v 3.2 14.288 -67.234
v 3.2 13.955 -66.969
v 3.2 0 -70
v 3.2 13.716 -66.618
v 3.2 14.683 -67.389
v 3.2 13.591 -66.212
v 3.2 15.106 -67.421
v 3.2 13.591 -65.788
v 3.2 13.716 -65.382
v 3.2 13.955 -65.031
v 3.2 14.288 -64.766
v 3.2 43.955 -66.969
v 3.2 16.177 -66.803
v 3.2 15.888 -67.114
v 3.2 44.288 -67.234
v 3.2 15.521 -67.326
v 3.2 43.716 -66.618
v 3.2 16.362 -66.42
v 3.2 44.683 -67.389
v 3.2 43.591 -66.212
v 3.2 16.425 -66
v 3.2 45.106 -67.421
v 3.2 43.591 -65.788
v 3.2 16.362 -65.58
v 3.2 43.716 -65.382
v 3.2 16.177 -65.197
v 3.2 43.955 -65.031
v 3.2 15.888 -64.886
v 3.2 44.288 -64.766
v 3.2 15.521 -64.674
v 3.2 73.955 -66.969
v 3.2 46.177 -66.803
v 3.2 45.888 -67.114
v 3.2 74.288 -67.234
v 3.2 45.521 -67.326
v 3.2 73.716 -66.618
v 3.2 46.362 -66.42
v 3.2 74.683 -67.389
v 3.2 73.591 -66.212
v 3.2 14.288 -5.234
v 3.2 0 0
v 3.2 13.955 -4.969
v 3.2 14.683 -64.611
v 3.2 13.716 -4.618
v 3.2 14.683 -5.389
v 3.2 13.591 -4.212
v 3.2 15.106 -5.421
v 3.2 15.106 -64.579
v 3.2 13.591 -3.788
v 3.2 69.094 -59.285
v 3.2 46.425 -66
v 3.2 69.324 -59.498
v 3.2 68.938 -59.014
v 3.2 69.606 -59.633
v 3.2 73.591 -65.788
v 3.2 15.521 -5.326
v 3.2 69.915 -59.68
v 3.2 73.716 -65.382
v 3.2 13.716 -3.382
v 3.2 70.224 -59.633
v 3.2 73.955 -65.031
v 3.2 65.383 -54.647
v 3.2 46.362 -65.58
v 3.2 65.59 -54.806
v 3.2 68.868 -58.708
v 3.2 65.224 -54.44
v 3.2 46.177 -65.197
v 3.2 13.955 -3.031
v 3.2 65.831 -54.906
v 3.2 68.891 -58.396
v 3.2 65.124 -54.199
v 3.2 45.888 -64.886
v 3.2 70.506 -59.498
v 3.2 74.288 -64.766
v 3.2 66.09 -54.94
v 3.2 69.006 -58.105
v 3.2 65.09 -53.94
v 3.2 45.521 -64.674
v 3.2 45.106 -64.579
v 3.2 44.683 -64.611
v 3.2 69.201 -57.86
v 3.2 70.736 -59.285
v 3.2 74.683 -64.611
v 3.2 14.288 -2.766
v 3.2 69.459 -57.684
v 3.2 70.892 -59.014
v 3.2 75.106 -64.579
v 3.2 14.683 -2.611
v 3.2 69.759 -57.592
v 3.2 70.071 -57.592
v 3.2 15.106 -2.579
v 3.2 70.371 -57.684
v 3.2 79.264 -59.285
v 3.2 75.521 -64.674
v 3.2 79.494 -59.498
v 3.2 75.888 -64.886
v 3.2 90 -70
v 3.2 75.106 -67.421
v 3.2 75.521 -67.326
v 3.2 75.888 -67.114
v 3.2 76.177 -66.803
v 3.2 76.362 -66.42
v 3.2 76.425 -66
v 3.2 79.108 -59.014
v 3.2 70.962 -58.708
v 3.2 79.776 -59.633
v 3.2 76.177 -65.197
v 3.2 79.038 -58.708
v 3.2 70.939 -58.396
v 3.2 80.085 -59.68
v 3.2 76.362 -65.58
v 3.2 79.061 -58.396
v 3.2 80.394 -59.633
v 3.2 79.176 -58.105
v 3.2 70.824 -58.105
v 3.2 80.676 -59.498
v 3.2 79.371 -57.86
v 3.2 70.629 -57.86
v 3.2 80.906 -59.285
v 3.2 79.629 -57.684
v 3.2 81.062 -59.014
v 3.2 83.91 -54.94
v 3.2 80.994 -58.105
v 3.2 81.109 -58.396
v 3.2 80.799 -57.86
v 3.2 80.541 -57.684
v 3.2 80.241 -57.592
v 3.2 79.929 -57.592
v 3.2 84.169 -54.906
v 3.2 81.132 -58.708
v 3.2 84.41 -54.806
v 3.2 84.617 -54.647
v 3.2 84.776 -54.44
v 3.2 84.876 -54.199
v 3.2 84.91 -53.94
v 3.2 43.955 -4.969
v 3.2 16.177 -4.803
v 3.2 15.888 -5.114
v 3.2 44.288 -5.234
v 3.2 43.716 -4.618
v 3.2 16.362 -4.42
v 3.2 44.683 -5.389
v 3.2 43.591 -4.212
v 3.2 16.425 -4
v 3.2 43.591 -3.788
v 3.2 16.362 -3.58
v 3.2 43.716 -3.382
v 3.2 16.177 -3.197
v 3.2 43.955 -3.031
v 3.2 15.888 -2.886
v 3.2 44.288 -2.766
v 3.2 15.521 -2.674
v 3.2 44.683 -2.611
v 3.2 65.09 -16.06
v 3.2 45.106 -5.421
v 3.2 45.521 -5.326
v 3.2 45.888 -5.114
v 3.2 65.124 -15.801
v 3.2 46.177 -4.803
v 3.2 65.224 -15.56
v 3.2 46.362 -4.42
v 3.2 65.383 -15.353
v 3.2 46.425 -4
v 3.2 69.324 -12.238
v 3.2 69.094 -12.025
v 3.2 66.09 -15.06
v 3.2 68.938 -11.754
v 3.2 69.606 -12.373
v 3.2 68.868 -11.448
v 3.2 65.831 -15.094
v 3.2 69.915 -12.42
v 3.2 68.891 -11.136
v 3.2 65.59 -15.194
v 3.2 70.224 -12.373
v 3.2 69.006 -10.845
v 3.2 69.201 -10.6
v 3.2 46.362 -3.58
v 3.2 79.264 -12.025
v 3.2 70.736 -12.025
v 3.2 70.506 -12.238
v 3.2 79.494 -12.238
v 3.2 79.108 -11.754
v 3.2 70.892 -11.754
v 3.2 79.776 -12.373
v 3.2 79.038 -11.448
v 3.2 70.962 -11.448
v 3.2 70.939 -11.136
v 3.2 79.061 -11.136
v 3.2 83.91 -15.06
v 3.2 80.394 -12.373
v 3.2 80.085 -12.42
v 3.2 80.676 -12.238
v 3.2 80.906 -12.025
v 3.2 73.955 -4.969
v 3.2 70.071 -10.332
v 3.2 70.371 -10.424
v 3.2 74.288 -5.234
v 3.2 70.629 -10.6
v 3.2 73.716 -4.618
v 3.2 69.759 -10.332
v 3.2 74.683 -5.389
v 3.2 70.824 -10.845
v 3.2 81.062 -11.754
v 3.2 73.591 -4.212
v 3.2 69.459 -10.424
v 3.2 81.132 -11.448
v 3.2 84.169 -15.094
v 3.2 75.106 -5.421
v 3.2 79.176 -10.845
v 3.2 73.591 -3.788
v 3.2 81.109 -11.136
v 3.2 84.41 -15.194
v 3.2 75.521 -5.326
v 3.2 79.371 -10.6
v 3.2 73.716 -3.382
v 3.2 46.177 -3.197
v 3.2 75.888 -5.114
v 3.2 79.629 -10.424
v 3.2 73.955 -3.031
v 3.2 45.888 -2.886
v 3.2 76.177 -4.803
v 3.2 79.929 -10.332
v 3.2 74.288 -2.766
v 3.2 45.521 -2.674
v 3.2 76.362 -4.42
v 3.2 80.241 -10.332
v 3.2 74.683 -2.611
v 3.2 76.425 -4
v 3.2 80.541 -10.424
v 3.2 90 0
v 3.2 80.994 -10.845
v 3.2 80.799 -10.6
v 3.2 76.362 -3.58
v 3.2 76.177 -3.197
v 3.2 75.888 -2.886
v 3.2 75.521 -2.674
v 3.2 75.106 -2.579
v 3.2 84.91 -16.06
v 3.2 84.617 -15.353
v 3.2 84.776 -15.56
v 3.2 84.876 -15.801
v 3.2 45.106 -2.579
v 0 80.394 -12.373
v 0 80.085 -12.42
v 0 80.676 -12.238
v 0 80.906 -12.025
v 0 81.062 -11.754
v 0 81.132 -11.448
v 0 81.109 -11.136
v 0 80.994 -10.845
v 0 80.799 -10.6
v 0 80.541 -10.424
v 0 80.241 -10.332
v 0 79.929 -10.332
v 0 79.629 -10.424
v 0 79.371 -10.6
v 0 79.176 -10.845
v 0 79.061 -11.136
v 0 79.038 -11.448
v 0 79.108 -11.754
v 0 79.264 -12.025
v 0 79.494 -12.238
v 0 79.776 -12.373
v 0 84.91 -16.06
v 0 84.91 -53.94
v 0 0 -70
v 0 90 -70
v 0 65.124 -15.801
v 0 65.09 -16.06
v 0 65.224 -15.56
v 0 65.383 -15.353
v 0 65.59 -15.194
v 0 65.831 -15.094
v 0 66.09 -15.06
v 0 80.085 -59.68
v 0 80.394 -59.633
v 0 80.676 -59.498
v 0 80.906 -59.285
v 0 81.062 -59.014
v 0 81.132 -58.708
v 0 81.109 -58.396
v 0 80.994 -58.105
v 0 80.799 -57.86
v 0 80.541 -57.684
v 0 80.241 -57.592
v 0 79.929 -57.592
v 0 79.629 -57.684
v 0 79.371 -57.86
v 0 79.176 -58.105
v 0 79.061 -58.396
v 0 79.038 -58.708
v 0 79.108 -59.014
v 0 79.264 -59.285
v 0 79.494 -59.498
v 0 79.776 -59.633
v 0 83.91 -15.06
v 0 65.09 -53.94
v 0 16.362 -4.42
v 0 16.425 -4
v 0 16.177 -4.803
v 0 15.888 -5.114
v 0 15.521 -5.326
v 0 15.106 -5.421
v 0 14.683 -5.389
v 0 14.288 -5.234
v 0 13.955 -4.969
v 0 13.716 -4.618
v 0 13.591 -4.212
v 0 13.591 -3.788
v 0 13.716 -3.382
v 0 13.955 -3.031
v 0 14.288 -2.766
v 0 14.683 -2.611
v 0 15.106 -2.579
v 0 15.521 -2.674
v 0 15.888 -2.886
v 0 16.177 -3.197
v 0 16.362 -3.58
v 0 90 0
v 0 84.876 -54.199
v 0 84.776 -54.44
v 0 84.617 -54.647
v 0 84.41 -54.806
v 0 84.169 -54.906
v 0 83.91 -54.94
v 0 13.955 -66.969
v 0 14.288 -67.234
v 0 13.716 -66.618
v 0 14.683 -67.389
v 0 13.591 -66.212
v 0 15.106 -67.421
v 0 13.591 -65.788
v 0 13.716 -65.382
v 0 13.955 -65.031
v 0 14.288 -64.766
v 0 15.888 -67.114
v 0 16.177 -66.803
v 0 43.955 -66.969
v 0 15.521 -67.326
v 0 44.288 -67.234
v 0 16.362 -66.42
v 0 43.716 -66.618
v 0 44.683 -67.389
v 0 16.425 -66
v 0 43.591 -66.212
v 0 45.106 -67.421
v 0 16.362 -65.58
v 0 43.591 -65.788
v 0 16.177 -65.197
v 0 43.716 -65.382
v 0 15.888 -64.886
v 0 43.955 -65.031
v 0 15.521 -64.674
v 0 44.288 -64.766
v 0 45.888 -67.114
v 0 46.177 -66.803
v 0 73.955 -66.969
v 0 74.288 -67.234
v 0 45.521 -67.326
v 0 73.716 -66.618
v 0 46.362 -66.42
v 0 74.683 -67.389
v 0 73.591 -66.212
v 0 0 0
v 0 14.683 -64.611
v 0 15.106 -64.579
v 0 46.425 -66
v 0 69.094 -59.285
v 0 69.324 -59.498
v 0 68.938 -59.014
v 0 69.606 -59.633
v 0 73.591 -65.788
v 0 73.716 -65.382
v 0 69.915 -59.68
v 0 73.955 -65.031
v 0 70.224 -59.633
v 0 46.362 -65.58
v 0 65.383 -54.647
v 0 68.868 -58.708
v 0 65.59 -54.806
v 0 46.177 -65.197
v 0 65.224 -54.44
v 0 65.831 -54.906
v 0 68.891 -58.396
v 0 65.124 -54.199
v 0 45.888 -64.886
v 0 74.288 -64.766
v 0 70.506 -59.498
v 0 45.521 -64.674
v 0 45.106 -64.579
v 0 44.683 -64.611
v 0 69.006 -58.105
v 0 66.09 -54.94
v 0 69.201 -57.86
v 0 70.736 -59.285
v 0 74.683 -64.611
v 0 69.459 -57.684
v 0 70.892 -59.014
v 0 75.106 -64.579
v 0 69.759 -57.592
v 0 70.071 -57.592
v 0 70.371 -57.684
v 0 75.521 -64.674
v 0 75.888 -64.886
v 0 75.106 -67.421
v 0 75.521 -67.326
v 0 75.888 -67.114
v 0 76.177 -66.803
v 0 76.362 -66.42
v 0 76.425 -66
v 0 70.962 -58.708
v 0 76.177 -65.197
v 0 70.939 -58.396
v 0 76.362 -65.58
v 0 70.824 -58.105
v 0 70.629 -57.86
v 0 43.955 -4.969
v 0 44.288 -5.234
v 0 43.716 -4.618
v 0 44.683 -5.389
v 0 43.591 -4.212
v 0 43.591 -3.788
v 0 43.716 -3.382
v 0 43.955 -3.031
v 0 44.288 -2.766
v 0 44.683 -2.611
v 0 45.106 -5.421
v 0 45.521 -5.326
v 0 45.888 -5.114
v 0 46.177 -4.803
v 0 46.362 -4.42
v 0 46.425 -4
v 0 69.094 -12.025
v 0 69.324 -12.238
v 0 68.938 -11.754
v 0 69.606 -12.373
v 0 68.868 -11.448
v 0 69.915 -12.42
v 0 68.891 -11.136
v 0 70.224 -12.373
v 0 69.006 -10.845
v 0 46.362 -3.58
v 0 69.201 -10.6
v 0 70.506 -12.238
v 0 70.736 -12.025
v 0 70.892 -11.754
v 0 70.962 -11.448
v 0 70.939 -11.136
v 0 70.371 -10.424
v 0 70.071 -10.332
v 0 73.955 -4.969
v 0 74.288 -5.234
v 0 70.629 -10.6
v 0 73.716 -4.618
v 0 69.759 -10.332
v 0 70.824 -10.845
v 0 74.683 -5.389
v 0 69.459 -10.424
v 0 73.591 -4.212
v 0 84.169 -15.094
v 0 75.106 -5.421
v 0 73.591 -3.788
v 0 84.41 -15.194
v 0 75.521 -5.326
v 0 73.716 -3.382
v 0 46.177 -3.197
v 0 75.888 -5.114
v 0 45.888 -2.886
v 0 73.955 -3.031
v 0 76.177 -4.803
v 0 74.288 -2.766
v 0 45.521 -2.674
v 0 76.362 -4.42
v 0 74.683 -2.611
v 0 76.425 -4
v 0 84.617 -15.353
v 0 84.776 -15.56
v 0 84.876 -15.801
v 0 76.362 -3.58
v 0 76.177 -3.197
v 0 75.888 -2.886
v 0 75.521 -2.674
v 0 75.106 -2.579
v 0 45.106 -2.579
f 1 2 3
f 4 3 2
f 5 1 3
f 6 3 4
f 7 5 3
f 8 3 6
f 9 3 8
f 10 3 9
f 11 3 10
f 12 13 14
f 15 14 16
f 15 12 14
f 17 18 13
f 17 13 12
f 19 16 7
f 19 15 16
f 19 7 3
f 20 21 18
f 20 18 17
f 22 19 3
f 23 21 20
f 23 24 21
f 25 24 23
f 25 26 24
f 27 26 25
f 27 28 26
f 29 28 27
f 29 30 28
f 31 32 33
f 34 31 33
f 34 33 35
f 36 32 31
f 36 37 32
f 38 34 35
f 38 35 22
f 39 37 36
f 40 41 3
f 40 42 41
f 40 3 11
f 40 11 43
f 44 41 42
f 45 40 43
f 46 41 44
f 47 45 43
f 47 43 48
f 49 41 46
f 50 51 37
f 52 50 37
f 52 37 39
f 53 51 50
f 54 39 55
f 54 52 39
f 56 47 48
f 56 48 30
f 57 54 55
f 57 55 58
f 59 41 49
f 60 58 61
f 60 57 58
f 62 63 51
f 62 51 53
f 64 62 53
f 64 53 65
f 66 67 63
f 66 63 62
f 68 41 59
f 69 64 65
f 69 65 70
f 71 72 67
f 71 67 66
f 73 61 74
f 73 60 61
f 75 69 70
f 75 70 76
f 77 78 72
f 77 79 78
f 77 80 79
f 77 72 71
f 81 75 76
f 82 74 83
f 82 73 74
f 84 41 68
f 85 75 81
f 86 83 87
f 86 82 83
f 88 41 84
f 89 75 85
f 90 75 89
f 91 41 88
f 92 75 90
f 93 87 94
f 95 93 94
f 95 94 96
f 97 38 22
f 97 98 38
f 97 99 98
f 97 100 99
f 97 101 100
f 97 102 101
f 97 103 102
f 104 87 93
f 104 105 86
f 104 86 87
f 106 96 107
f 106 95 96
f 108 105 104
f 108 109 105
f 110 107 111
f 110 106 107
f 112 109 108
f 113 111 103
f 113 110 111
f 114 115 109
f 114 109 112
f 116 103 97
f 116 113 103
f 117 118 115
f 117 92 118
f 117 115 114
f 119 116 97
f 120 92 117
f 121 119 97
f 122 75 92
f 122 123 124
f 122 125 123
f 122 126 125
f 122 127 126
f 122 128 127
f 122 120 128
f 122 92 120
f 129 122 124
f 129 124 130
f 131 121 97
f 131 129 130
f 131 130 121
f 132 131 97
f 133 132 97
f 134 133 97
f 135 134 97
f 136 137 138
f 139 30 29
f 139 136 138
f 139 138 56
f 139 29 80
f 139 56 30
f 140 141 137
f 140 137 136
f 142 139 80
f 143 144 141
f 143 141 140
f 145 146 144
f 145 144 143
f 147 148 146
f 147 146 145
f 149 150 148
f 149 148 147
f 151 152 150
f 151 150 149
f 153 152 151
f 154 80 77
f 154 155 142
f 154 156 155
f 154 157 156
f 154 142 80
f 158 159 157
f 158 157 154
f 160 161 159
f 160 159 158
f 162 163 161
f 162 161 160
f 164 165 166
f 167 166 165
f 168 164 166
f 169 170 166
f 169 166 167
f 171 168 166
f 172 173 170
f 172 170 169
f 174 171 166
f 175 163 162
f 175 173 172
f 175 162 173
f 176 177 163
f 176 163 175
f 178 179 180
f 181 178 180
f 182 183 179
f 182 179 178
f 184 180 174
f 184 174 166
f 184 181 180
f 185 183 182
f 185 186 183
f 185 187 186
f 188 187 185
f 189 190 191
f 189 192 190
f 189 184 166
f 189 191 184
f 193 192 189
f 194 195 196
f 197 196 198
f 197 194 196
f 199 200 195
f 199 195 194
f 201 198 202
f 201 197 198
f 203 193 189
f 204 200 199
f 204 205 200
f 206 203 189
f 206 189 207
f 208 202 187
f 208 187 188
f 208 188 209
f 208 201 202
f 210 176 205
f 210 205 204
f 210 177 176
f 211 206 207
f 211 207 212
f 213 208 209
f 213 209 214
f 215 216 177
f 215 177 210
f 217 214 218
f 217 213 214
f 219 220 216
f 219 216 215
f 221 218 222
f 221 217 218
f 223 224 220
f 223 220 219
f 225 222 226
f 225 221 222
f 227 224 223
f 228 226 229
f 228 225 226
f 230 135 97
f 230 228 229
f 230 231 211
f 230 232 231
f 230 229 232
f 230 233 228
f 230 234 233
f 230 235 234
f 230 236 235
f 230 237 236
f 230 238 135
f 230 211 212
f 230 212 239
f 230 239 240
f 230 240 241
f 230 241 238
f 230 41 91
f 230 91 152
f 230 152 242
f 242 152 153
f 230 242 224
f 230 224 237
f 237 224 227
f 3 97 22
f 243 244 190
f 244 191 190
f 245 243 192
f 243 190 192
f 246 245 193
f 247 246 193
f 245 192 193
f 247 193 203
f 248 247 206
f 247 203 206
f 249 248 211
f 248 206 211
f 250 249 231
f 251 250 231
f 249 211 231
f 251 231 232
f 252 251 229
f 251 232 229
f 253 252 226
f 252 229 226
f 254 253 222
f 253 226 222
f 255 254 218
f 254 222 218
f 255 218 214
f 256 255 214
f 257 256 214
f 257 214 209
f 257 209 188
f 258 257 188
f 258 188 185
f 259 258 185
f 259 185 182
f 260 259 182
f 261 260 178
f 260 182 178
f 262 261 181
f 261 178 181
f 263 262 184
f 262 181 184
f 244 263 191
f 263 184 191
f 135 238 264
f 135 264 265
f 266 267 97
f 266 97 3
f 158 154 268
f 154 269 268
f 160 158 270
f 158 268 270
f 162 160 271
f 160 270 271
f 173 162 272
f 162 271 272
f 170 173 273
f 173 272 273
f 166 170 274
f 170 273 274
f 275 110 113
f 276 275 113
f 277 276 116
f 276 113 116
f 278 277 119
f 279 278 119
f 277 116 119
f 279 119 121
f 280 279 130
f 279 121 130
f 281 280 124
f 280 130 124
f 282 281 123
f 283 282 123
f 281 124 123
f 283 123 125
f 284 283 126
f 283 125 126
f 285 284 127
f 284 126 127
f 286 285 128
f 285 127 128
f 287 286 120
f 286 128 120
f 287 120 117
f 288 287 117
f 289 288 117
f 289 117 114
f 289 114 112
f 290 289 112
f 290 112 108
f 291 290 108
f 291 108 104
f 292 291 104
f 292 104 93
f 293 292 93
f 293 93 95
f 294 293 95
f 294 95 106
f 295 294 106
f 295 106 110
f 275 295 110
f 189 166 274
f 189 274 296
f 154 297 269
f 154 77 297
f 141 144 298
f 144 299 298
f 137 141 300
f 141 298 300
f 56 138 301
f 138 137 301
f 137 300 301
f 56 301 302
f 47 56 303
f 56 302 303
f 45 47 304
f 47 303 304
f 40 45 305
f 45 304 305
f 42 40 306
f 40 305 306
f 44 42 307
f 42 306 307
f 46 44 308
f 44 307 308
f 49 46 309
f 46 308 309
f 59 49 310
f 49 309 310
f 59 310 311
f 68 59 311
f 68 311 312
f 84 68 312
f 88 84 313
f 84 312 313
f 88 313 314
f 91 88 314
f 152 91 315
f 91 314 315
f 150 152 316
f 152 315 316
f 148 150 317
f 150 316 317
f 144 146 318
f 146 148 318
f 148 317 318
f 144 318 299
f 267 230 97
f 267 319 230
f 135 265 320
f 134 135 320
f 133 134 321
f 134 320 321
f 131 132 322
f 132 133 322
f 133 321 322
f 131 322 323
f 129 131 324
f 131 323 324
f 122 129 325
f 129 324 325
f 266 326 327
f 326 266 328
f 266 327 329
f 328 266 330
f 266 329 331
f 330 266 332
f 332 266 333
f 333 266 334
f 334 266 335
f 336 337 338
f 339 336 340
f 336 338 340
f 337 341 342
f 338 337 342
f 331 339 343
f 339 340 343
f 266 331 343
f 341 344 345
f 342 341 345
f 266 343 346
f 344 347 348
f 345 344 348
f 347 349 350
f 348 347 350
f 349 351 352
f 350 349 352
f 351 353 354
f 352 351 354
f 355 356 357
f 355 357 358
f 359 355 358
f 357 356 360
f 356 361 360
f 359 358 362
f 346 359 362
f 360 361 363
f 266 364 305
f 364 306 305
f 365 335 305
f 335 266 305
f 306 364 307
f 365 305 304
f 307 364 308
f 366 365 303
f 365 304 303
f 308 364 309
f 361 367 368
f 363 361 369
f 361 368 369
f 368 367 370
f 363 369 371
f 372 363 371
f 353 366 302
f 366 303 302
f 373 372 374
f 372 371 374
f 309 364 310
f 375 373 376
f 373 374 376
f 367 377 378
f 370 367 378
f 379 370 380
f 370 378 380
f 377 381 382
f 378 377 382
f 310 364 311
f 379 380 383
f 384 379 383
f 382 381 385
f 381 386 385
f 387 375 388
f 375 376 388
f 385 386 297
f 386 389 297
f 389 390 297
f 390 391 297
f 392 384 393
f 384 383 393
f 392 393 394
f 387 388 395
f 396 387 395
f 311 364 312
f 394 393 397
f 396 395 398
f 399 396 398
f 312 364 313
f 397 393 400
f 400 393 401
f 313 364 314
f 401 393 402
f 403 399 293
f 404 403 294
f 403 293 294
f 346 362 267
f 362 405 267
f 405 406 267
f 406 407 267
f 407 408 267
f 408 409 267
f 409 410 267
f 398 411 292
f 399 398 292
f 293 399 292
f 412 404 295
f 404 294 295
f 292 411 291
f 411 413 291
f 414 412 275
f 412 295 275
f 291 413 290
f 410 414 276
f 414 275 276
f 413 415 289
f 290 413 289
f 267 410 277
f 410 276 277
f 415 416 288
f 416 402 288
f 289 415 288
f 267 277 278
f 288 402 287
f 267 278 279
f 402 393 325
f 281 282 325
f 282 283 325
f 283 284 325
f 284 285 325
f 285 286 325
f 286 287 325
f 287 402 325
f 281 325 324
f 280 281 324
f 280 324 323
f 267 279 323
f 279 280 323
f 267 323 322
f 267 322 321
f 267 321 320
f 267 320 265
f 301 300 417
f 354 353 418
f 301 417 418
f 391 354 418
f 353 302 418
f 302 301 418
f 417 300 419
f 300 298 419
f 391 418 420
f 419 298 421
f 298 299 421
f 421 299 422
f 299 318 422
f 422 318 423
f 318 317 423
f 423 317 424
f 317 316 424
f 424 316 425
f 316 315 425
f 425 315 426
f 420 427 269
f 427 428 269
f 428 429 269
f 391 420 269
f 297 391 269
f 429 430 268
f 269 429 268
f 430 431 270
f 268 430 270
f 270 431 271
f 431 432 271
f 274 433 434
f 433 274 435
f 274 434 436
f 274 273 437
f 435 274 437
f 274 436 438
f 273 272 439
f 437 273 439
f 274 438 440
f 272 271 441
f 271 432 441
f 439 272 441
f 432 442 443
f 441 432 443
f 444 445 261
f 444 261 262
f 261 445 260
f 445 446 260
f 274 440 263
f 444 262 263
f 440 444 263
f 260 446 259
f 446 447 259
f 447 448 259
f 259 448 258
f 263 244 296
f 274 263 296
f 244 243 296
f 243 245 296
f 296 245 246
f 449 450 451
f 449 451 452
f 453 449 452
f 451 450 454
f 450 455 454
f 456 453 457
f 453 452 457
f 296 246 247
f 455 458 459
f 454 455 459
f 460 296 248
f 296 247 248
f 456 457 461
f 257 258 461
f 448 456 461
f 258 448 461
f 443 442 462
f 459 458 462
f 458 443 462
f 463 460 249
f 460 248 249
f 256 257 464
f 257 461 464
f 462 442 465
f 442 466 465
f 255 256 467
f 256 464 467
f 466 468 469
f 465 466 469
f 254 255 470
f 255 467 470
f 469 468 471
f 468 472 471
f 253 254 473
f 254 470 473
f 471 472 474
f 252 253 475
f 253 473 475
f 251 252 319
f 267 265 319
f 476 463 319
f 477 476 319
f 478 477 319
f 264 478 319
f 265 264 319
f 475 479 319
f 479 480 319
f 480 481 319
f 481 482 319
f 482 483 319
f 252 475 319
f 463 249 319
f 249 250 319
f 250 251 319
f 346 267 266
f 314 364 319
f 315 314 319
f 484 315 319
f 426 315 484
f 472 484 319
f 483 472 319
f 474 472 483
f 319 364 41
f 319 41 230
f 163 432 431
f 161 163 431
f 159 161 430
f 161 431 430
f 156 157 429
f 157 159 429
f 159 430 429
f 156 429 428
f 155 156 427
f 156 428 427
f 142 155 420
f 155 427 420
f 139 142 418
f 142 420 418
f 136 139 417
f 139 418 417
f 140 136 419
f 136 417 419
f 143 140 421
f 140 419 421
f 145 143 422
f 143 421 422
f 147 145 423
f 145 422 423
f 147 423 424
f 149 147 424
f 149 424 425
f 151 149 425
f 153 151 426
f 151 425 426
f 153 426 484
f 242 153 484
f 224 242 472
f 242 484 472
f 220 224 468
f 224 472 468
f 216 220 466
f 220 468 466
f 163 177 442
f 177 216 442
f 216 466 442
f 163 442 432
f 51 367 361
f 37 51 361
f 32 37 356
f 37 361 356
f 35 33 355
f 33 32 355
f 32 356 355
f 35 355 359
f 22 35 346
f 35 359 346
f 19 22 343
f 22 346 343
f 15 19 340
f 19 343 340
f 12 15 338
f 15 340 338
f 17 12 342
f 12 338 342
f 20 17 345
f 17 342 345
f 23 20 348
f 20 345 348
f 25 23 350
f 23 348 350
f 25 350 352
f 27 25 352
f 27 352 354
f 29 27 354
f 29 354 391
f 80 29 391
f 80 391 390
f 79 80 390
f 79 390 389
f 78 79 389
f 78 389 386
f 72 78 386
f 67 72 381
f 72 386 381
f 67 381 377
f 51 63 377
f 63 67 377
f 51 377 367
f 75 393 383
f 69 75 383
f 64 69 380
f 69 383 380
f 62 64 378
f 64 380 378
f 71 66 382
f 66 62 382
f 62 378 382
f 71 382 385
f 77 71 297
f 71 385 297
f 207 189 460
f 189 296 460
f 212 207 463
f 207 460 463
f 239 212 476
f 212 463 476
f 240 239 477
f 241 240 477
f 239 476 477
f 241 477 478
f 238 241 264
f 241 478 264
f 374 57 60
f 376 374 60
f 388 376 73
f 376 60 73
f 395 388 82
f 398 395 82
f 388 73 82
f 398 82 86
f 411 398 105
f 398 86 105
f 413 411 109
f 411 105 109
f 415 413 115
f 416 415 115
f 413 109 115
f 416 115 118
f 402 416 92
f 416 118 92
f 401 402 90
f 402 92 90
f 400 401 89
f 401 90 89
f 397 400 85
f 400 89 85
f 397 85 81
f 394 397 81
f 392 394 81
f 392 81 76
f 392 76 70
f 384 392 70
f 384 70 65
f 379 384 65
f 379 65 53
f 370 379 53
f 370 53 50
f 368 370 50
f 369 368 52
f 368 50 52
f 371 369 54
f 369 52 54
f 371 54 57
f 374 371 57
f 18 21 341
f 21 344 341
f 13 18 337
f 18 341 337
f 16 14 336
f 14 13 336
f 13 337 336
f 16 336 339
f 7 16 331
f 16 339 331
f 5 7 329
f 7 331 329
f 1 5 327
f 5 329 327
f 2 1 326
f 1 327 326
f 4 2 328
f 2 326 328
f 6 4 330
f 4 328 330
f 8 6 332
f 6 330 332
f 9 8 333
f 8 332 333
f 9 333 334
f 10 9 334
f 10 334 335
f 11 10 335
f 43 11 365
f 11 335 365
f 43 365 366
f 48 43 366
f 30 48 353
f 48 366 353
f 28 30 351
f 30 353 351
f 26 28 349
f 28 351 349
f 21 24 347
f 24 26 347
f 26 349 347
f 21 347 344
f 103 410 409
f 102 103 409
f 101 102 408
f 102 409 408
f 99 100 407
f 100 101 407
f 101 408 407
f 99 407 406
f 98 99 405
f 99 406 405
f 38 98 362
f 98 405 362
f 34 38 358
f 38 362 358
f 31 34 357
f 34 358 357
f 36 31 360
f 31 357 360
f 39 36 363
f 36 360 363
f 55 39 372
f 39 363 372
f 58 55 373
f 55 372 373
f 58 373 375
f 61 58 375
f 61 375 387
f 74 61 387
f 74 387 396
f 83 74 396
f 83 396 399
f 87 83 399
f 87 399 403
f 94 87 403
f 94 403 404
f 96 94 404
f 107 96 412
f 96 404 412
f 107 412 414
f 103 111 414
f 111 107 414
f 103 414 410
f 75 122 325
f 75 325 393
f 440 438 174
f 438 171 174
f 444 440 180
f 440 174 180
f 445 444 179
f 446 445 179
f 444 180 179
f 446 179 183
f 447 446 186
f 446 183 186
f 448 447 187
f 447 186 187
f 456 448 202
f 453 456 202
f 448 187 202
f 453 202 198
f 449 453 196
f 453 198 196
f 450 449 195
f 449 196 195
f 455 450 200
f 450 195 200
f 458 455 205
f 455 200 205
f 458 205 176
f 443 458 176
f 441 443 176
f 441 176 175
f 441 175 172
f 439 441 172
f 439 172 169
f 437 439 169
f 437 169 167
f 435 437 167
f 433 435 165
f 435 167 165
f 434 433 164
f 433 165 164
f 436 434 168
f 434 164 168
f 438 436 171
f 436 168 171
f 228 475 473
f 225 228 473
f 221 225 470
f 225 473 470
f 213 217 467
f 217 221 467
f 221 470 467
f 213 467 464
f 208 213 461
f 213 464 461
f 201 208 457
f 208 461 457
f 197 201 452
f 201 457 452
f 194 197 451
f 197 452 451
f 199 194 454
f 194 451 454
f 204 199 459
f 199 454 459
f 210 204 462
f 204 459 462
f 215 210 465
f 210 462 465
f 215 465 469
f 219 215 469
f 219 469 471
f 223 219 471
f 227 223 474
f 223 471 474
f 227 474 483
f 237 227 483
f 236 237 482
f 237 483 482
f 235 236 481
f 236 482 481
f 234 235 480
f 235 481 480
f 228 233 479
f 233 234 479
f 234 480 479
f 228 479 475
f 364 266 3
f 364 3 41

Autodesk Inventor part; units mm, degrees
ref_plane "YZ Plane" through (0, 0, 0) normal (1, 0, 0) x (0, 1, 0)
ref_plane "XZ Plane" through (0, 0, 0) normal (0, 1, 0) x (-1, 0, 0)
ref_plane "XY Plane" through (0, 0, 0) normal (0, 0, 1) x (1, 0, 0)
sketch "Sketch1" plane through (0, 0, 0) normal (1, 0, 0) x (0, 1, 0)
  line L0 (0, 0) -> (90, 0)
  line L1 (90, 0) -> (90, -70)
  line L2 (90, -70) -> (0, -70)
  line L3 (0, -70) -> (0, 0)
  circle A0 centre (15, -4) radius 1.425
  circle A1 centre (45, -4) radius 1.425
  circle A2 centre (75, -4) radius 1.425
  line L4 (0, -4) -> (90, -4) construction
  line L5 (45, -70) -> (45, 0) construction
  line L6 (0, -35) -> (90, -35) construction
  circle A3 centre (15, -66) radius 1.425
  circle A4 centre (45, -66) radius 1.425
  circle A5 centre (75, -66) radius 1.425
  dimension "d0" = 2.85
  dimension "d1" = 90
  dimension "d2" = 30
  dimension "d3" = 4
  dimension "d4" = 70
extrude "Extrusion1" add sketch "Sketch1" along normal blind 3.2
sketch "Sketch2" plane through (3.2, 0, 0) normal (1, 0, 0) x (0, 0, -1)
  circle A0 centre (66, 75) radius 1.425 projected
  circle A1 centre (4, 75) radius 1.425 projected
  line L0 (70, 90) -> (0, 90) projected
  line L1 (35, 90) -> (35, -95.4624)
  line L2 (15.06, 84.91) -> (54.94, 84.91)
  line L3 (54.94, 84.91) -> (54.94, 65.09)
  line L4 (54.94, 65.09) -> (15.06, 65.09)
  line L5 (15.06, 65.09) -> (15.06, 84.91)
  line L6 (4, 75) -> (66, 75) construction
  circle A2 centre (11.37, 80.085) radius 1.05
  circle A3 centre (11.37, 69.915) radius 1.05
  circle A4 centre (58.63, 80.085) radius 1.05
  circle A5 centre (58.63, 69.915) radius 1.05
  point P0 (54.94, 75)
  dimension "d7" = 39.88
  dimension "d8" = 19.82
  dimension "d9" = 10.17
  dimension "d10" = 47.26
  dimension "d11" = 2.1
extrude "Extrusion2" cut sketch "Sketch2" against normal through all contours L2 L3 L4 L1 | L1 L4 L5 L2 | A2 | A3 | A4 | A5
fillet "Fillet1" radius 1 4 edges at (1.6, 84.91, -54.94) (1.6, 65.09, -54.94) (1.6, 65.09, -15.06) (1.6, 84.91, -15.06)
properties part number "ServoPlate1"
